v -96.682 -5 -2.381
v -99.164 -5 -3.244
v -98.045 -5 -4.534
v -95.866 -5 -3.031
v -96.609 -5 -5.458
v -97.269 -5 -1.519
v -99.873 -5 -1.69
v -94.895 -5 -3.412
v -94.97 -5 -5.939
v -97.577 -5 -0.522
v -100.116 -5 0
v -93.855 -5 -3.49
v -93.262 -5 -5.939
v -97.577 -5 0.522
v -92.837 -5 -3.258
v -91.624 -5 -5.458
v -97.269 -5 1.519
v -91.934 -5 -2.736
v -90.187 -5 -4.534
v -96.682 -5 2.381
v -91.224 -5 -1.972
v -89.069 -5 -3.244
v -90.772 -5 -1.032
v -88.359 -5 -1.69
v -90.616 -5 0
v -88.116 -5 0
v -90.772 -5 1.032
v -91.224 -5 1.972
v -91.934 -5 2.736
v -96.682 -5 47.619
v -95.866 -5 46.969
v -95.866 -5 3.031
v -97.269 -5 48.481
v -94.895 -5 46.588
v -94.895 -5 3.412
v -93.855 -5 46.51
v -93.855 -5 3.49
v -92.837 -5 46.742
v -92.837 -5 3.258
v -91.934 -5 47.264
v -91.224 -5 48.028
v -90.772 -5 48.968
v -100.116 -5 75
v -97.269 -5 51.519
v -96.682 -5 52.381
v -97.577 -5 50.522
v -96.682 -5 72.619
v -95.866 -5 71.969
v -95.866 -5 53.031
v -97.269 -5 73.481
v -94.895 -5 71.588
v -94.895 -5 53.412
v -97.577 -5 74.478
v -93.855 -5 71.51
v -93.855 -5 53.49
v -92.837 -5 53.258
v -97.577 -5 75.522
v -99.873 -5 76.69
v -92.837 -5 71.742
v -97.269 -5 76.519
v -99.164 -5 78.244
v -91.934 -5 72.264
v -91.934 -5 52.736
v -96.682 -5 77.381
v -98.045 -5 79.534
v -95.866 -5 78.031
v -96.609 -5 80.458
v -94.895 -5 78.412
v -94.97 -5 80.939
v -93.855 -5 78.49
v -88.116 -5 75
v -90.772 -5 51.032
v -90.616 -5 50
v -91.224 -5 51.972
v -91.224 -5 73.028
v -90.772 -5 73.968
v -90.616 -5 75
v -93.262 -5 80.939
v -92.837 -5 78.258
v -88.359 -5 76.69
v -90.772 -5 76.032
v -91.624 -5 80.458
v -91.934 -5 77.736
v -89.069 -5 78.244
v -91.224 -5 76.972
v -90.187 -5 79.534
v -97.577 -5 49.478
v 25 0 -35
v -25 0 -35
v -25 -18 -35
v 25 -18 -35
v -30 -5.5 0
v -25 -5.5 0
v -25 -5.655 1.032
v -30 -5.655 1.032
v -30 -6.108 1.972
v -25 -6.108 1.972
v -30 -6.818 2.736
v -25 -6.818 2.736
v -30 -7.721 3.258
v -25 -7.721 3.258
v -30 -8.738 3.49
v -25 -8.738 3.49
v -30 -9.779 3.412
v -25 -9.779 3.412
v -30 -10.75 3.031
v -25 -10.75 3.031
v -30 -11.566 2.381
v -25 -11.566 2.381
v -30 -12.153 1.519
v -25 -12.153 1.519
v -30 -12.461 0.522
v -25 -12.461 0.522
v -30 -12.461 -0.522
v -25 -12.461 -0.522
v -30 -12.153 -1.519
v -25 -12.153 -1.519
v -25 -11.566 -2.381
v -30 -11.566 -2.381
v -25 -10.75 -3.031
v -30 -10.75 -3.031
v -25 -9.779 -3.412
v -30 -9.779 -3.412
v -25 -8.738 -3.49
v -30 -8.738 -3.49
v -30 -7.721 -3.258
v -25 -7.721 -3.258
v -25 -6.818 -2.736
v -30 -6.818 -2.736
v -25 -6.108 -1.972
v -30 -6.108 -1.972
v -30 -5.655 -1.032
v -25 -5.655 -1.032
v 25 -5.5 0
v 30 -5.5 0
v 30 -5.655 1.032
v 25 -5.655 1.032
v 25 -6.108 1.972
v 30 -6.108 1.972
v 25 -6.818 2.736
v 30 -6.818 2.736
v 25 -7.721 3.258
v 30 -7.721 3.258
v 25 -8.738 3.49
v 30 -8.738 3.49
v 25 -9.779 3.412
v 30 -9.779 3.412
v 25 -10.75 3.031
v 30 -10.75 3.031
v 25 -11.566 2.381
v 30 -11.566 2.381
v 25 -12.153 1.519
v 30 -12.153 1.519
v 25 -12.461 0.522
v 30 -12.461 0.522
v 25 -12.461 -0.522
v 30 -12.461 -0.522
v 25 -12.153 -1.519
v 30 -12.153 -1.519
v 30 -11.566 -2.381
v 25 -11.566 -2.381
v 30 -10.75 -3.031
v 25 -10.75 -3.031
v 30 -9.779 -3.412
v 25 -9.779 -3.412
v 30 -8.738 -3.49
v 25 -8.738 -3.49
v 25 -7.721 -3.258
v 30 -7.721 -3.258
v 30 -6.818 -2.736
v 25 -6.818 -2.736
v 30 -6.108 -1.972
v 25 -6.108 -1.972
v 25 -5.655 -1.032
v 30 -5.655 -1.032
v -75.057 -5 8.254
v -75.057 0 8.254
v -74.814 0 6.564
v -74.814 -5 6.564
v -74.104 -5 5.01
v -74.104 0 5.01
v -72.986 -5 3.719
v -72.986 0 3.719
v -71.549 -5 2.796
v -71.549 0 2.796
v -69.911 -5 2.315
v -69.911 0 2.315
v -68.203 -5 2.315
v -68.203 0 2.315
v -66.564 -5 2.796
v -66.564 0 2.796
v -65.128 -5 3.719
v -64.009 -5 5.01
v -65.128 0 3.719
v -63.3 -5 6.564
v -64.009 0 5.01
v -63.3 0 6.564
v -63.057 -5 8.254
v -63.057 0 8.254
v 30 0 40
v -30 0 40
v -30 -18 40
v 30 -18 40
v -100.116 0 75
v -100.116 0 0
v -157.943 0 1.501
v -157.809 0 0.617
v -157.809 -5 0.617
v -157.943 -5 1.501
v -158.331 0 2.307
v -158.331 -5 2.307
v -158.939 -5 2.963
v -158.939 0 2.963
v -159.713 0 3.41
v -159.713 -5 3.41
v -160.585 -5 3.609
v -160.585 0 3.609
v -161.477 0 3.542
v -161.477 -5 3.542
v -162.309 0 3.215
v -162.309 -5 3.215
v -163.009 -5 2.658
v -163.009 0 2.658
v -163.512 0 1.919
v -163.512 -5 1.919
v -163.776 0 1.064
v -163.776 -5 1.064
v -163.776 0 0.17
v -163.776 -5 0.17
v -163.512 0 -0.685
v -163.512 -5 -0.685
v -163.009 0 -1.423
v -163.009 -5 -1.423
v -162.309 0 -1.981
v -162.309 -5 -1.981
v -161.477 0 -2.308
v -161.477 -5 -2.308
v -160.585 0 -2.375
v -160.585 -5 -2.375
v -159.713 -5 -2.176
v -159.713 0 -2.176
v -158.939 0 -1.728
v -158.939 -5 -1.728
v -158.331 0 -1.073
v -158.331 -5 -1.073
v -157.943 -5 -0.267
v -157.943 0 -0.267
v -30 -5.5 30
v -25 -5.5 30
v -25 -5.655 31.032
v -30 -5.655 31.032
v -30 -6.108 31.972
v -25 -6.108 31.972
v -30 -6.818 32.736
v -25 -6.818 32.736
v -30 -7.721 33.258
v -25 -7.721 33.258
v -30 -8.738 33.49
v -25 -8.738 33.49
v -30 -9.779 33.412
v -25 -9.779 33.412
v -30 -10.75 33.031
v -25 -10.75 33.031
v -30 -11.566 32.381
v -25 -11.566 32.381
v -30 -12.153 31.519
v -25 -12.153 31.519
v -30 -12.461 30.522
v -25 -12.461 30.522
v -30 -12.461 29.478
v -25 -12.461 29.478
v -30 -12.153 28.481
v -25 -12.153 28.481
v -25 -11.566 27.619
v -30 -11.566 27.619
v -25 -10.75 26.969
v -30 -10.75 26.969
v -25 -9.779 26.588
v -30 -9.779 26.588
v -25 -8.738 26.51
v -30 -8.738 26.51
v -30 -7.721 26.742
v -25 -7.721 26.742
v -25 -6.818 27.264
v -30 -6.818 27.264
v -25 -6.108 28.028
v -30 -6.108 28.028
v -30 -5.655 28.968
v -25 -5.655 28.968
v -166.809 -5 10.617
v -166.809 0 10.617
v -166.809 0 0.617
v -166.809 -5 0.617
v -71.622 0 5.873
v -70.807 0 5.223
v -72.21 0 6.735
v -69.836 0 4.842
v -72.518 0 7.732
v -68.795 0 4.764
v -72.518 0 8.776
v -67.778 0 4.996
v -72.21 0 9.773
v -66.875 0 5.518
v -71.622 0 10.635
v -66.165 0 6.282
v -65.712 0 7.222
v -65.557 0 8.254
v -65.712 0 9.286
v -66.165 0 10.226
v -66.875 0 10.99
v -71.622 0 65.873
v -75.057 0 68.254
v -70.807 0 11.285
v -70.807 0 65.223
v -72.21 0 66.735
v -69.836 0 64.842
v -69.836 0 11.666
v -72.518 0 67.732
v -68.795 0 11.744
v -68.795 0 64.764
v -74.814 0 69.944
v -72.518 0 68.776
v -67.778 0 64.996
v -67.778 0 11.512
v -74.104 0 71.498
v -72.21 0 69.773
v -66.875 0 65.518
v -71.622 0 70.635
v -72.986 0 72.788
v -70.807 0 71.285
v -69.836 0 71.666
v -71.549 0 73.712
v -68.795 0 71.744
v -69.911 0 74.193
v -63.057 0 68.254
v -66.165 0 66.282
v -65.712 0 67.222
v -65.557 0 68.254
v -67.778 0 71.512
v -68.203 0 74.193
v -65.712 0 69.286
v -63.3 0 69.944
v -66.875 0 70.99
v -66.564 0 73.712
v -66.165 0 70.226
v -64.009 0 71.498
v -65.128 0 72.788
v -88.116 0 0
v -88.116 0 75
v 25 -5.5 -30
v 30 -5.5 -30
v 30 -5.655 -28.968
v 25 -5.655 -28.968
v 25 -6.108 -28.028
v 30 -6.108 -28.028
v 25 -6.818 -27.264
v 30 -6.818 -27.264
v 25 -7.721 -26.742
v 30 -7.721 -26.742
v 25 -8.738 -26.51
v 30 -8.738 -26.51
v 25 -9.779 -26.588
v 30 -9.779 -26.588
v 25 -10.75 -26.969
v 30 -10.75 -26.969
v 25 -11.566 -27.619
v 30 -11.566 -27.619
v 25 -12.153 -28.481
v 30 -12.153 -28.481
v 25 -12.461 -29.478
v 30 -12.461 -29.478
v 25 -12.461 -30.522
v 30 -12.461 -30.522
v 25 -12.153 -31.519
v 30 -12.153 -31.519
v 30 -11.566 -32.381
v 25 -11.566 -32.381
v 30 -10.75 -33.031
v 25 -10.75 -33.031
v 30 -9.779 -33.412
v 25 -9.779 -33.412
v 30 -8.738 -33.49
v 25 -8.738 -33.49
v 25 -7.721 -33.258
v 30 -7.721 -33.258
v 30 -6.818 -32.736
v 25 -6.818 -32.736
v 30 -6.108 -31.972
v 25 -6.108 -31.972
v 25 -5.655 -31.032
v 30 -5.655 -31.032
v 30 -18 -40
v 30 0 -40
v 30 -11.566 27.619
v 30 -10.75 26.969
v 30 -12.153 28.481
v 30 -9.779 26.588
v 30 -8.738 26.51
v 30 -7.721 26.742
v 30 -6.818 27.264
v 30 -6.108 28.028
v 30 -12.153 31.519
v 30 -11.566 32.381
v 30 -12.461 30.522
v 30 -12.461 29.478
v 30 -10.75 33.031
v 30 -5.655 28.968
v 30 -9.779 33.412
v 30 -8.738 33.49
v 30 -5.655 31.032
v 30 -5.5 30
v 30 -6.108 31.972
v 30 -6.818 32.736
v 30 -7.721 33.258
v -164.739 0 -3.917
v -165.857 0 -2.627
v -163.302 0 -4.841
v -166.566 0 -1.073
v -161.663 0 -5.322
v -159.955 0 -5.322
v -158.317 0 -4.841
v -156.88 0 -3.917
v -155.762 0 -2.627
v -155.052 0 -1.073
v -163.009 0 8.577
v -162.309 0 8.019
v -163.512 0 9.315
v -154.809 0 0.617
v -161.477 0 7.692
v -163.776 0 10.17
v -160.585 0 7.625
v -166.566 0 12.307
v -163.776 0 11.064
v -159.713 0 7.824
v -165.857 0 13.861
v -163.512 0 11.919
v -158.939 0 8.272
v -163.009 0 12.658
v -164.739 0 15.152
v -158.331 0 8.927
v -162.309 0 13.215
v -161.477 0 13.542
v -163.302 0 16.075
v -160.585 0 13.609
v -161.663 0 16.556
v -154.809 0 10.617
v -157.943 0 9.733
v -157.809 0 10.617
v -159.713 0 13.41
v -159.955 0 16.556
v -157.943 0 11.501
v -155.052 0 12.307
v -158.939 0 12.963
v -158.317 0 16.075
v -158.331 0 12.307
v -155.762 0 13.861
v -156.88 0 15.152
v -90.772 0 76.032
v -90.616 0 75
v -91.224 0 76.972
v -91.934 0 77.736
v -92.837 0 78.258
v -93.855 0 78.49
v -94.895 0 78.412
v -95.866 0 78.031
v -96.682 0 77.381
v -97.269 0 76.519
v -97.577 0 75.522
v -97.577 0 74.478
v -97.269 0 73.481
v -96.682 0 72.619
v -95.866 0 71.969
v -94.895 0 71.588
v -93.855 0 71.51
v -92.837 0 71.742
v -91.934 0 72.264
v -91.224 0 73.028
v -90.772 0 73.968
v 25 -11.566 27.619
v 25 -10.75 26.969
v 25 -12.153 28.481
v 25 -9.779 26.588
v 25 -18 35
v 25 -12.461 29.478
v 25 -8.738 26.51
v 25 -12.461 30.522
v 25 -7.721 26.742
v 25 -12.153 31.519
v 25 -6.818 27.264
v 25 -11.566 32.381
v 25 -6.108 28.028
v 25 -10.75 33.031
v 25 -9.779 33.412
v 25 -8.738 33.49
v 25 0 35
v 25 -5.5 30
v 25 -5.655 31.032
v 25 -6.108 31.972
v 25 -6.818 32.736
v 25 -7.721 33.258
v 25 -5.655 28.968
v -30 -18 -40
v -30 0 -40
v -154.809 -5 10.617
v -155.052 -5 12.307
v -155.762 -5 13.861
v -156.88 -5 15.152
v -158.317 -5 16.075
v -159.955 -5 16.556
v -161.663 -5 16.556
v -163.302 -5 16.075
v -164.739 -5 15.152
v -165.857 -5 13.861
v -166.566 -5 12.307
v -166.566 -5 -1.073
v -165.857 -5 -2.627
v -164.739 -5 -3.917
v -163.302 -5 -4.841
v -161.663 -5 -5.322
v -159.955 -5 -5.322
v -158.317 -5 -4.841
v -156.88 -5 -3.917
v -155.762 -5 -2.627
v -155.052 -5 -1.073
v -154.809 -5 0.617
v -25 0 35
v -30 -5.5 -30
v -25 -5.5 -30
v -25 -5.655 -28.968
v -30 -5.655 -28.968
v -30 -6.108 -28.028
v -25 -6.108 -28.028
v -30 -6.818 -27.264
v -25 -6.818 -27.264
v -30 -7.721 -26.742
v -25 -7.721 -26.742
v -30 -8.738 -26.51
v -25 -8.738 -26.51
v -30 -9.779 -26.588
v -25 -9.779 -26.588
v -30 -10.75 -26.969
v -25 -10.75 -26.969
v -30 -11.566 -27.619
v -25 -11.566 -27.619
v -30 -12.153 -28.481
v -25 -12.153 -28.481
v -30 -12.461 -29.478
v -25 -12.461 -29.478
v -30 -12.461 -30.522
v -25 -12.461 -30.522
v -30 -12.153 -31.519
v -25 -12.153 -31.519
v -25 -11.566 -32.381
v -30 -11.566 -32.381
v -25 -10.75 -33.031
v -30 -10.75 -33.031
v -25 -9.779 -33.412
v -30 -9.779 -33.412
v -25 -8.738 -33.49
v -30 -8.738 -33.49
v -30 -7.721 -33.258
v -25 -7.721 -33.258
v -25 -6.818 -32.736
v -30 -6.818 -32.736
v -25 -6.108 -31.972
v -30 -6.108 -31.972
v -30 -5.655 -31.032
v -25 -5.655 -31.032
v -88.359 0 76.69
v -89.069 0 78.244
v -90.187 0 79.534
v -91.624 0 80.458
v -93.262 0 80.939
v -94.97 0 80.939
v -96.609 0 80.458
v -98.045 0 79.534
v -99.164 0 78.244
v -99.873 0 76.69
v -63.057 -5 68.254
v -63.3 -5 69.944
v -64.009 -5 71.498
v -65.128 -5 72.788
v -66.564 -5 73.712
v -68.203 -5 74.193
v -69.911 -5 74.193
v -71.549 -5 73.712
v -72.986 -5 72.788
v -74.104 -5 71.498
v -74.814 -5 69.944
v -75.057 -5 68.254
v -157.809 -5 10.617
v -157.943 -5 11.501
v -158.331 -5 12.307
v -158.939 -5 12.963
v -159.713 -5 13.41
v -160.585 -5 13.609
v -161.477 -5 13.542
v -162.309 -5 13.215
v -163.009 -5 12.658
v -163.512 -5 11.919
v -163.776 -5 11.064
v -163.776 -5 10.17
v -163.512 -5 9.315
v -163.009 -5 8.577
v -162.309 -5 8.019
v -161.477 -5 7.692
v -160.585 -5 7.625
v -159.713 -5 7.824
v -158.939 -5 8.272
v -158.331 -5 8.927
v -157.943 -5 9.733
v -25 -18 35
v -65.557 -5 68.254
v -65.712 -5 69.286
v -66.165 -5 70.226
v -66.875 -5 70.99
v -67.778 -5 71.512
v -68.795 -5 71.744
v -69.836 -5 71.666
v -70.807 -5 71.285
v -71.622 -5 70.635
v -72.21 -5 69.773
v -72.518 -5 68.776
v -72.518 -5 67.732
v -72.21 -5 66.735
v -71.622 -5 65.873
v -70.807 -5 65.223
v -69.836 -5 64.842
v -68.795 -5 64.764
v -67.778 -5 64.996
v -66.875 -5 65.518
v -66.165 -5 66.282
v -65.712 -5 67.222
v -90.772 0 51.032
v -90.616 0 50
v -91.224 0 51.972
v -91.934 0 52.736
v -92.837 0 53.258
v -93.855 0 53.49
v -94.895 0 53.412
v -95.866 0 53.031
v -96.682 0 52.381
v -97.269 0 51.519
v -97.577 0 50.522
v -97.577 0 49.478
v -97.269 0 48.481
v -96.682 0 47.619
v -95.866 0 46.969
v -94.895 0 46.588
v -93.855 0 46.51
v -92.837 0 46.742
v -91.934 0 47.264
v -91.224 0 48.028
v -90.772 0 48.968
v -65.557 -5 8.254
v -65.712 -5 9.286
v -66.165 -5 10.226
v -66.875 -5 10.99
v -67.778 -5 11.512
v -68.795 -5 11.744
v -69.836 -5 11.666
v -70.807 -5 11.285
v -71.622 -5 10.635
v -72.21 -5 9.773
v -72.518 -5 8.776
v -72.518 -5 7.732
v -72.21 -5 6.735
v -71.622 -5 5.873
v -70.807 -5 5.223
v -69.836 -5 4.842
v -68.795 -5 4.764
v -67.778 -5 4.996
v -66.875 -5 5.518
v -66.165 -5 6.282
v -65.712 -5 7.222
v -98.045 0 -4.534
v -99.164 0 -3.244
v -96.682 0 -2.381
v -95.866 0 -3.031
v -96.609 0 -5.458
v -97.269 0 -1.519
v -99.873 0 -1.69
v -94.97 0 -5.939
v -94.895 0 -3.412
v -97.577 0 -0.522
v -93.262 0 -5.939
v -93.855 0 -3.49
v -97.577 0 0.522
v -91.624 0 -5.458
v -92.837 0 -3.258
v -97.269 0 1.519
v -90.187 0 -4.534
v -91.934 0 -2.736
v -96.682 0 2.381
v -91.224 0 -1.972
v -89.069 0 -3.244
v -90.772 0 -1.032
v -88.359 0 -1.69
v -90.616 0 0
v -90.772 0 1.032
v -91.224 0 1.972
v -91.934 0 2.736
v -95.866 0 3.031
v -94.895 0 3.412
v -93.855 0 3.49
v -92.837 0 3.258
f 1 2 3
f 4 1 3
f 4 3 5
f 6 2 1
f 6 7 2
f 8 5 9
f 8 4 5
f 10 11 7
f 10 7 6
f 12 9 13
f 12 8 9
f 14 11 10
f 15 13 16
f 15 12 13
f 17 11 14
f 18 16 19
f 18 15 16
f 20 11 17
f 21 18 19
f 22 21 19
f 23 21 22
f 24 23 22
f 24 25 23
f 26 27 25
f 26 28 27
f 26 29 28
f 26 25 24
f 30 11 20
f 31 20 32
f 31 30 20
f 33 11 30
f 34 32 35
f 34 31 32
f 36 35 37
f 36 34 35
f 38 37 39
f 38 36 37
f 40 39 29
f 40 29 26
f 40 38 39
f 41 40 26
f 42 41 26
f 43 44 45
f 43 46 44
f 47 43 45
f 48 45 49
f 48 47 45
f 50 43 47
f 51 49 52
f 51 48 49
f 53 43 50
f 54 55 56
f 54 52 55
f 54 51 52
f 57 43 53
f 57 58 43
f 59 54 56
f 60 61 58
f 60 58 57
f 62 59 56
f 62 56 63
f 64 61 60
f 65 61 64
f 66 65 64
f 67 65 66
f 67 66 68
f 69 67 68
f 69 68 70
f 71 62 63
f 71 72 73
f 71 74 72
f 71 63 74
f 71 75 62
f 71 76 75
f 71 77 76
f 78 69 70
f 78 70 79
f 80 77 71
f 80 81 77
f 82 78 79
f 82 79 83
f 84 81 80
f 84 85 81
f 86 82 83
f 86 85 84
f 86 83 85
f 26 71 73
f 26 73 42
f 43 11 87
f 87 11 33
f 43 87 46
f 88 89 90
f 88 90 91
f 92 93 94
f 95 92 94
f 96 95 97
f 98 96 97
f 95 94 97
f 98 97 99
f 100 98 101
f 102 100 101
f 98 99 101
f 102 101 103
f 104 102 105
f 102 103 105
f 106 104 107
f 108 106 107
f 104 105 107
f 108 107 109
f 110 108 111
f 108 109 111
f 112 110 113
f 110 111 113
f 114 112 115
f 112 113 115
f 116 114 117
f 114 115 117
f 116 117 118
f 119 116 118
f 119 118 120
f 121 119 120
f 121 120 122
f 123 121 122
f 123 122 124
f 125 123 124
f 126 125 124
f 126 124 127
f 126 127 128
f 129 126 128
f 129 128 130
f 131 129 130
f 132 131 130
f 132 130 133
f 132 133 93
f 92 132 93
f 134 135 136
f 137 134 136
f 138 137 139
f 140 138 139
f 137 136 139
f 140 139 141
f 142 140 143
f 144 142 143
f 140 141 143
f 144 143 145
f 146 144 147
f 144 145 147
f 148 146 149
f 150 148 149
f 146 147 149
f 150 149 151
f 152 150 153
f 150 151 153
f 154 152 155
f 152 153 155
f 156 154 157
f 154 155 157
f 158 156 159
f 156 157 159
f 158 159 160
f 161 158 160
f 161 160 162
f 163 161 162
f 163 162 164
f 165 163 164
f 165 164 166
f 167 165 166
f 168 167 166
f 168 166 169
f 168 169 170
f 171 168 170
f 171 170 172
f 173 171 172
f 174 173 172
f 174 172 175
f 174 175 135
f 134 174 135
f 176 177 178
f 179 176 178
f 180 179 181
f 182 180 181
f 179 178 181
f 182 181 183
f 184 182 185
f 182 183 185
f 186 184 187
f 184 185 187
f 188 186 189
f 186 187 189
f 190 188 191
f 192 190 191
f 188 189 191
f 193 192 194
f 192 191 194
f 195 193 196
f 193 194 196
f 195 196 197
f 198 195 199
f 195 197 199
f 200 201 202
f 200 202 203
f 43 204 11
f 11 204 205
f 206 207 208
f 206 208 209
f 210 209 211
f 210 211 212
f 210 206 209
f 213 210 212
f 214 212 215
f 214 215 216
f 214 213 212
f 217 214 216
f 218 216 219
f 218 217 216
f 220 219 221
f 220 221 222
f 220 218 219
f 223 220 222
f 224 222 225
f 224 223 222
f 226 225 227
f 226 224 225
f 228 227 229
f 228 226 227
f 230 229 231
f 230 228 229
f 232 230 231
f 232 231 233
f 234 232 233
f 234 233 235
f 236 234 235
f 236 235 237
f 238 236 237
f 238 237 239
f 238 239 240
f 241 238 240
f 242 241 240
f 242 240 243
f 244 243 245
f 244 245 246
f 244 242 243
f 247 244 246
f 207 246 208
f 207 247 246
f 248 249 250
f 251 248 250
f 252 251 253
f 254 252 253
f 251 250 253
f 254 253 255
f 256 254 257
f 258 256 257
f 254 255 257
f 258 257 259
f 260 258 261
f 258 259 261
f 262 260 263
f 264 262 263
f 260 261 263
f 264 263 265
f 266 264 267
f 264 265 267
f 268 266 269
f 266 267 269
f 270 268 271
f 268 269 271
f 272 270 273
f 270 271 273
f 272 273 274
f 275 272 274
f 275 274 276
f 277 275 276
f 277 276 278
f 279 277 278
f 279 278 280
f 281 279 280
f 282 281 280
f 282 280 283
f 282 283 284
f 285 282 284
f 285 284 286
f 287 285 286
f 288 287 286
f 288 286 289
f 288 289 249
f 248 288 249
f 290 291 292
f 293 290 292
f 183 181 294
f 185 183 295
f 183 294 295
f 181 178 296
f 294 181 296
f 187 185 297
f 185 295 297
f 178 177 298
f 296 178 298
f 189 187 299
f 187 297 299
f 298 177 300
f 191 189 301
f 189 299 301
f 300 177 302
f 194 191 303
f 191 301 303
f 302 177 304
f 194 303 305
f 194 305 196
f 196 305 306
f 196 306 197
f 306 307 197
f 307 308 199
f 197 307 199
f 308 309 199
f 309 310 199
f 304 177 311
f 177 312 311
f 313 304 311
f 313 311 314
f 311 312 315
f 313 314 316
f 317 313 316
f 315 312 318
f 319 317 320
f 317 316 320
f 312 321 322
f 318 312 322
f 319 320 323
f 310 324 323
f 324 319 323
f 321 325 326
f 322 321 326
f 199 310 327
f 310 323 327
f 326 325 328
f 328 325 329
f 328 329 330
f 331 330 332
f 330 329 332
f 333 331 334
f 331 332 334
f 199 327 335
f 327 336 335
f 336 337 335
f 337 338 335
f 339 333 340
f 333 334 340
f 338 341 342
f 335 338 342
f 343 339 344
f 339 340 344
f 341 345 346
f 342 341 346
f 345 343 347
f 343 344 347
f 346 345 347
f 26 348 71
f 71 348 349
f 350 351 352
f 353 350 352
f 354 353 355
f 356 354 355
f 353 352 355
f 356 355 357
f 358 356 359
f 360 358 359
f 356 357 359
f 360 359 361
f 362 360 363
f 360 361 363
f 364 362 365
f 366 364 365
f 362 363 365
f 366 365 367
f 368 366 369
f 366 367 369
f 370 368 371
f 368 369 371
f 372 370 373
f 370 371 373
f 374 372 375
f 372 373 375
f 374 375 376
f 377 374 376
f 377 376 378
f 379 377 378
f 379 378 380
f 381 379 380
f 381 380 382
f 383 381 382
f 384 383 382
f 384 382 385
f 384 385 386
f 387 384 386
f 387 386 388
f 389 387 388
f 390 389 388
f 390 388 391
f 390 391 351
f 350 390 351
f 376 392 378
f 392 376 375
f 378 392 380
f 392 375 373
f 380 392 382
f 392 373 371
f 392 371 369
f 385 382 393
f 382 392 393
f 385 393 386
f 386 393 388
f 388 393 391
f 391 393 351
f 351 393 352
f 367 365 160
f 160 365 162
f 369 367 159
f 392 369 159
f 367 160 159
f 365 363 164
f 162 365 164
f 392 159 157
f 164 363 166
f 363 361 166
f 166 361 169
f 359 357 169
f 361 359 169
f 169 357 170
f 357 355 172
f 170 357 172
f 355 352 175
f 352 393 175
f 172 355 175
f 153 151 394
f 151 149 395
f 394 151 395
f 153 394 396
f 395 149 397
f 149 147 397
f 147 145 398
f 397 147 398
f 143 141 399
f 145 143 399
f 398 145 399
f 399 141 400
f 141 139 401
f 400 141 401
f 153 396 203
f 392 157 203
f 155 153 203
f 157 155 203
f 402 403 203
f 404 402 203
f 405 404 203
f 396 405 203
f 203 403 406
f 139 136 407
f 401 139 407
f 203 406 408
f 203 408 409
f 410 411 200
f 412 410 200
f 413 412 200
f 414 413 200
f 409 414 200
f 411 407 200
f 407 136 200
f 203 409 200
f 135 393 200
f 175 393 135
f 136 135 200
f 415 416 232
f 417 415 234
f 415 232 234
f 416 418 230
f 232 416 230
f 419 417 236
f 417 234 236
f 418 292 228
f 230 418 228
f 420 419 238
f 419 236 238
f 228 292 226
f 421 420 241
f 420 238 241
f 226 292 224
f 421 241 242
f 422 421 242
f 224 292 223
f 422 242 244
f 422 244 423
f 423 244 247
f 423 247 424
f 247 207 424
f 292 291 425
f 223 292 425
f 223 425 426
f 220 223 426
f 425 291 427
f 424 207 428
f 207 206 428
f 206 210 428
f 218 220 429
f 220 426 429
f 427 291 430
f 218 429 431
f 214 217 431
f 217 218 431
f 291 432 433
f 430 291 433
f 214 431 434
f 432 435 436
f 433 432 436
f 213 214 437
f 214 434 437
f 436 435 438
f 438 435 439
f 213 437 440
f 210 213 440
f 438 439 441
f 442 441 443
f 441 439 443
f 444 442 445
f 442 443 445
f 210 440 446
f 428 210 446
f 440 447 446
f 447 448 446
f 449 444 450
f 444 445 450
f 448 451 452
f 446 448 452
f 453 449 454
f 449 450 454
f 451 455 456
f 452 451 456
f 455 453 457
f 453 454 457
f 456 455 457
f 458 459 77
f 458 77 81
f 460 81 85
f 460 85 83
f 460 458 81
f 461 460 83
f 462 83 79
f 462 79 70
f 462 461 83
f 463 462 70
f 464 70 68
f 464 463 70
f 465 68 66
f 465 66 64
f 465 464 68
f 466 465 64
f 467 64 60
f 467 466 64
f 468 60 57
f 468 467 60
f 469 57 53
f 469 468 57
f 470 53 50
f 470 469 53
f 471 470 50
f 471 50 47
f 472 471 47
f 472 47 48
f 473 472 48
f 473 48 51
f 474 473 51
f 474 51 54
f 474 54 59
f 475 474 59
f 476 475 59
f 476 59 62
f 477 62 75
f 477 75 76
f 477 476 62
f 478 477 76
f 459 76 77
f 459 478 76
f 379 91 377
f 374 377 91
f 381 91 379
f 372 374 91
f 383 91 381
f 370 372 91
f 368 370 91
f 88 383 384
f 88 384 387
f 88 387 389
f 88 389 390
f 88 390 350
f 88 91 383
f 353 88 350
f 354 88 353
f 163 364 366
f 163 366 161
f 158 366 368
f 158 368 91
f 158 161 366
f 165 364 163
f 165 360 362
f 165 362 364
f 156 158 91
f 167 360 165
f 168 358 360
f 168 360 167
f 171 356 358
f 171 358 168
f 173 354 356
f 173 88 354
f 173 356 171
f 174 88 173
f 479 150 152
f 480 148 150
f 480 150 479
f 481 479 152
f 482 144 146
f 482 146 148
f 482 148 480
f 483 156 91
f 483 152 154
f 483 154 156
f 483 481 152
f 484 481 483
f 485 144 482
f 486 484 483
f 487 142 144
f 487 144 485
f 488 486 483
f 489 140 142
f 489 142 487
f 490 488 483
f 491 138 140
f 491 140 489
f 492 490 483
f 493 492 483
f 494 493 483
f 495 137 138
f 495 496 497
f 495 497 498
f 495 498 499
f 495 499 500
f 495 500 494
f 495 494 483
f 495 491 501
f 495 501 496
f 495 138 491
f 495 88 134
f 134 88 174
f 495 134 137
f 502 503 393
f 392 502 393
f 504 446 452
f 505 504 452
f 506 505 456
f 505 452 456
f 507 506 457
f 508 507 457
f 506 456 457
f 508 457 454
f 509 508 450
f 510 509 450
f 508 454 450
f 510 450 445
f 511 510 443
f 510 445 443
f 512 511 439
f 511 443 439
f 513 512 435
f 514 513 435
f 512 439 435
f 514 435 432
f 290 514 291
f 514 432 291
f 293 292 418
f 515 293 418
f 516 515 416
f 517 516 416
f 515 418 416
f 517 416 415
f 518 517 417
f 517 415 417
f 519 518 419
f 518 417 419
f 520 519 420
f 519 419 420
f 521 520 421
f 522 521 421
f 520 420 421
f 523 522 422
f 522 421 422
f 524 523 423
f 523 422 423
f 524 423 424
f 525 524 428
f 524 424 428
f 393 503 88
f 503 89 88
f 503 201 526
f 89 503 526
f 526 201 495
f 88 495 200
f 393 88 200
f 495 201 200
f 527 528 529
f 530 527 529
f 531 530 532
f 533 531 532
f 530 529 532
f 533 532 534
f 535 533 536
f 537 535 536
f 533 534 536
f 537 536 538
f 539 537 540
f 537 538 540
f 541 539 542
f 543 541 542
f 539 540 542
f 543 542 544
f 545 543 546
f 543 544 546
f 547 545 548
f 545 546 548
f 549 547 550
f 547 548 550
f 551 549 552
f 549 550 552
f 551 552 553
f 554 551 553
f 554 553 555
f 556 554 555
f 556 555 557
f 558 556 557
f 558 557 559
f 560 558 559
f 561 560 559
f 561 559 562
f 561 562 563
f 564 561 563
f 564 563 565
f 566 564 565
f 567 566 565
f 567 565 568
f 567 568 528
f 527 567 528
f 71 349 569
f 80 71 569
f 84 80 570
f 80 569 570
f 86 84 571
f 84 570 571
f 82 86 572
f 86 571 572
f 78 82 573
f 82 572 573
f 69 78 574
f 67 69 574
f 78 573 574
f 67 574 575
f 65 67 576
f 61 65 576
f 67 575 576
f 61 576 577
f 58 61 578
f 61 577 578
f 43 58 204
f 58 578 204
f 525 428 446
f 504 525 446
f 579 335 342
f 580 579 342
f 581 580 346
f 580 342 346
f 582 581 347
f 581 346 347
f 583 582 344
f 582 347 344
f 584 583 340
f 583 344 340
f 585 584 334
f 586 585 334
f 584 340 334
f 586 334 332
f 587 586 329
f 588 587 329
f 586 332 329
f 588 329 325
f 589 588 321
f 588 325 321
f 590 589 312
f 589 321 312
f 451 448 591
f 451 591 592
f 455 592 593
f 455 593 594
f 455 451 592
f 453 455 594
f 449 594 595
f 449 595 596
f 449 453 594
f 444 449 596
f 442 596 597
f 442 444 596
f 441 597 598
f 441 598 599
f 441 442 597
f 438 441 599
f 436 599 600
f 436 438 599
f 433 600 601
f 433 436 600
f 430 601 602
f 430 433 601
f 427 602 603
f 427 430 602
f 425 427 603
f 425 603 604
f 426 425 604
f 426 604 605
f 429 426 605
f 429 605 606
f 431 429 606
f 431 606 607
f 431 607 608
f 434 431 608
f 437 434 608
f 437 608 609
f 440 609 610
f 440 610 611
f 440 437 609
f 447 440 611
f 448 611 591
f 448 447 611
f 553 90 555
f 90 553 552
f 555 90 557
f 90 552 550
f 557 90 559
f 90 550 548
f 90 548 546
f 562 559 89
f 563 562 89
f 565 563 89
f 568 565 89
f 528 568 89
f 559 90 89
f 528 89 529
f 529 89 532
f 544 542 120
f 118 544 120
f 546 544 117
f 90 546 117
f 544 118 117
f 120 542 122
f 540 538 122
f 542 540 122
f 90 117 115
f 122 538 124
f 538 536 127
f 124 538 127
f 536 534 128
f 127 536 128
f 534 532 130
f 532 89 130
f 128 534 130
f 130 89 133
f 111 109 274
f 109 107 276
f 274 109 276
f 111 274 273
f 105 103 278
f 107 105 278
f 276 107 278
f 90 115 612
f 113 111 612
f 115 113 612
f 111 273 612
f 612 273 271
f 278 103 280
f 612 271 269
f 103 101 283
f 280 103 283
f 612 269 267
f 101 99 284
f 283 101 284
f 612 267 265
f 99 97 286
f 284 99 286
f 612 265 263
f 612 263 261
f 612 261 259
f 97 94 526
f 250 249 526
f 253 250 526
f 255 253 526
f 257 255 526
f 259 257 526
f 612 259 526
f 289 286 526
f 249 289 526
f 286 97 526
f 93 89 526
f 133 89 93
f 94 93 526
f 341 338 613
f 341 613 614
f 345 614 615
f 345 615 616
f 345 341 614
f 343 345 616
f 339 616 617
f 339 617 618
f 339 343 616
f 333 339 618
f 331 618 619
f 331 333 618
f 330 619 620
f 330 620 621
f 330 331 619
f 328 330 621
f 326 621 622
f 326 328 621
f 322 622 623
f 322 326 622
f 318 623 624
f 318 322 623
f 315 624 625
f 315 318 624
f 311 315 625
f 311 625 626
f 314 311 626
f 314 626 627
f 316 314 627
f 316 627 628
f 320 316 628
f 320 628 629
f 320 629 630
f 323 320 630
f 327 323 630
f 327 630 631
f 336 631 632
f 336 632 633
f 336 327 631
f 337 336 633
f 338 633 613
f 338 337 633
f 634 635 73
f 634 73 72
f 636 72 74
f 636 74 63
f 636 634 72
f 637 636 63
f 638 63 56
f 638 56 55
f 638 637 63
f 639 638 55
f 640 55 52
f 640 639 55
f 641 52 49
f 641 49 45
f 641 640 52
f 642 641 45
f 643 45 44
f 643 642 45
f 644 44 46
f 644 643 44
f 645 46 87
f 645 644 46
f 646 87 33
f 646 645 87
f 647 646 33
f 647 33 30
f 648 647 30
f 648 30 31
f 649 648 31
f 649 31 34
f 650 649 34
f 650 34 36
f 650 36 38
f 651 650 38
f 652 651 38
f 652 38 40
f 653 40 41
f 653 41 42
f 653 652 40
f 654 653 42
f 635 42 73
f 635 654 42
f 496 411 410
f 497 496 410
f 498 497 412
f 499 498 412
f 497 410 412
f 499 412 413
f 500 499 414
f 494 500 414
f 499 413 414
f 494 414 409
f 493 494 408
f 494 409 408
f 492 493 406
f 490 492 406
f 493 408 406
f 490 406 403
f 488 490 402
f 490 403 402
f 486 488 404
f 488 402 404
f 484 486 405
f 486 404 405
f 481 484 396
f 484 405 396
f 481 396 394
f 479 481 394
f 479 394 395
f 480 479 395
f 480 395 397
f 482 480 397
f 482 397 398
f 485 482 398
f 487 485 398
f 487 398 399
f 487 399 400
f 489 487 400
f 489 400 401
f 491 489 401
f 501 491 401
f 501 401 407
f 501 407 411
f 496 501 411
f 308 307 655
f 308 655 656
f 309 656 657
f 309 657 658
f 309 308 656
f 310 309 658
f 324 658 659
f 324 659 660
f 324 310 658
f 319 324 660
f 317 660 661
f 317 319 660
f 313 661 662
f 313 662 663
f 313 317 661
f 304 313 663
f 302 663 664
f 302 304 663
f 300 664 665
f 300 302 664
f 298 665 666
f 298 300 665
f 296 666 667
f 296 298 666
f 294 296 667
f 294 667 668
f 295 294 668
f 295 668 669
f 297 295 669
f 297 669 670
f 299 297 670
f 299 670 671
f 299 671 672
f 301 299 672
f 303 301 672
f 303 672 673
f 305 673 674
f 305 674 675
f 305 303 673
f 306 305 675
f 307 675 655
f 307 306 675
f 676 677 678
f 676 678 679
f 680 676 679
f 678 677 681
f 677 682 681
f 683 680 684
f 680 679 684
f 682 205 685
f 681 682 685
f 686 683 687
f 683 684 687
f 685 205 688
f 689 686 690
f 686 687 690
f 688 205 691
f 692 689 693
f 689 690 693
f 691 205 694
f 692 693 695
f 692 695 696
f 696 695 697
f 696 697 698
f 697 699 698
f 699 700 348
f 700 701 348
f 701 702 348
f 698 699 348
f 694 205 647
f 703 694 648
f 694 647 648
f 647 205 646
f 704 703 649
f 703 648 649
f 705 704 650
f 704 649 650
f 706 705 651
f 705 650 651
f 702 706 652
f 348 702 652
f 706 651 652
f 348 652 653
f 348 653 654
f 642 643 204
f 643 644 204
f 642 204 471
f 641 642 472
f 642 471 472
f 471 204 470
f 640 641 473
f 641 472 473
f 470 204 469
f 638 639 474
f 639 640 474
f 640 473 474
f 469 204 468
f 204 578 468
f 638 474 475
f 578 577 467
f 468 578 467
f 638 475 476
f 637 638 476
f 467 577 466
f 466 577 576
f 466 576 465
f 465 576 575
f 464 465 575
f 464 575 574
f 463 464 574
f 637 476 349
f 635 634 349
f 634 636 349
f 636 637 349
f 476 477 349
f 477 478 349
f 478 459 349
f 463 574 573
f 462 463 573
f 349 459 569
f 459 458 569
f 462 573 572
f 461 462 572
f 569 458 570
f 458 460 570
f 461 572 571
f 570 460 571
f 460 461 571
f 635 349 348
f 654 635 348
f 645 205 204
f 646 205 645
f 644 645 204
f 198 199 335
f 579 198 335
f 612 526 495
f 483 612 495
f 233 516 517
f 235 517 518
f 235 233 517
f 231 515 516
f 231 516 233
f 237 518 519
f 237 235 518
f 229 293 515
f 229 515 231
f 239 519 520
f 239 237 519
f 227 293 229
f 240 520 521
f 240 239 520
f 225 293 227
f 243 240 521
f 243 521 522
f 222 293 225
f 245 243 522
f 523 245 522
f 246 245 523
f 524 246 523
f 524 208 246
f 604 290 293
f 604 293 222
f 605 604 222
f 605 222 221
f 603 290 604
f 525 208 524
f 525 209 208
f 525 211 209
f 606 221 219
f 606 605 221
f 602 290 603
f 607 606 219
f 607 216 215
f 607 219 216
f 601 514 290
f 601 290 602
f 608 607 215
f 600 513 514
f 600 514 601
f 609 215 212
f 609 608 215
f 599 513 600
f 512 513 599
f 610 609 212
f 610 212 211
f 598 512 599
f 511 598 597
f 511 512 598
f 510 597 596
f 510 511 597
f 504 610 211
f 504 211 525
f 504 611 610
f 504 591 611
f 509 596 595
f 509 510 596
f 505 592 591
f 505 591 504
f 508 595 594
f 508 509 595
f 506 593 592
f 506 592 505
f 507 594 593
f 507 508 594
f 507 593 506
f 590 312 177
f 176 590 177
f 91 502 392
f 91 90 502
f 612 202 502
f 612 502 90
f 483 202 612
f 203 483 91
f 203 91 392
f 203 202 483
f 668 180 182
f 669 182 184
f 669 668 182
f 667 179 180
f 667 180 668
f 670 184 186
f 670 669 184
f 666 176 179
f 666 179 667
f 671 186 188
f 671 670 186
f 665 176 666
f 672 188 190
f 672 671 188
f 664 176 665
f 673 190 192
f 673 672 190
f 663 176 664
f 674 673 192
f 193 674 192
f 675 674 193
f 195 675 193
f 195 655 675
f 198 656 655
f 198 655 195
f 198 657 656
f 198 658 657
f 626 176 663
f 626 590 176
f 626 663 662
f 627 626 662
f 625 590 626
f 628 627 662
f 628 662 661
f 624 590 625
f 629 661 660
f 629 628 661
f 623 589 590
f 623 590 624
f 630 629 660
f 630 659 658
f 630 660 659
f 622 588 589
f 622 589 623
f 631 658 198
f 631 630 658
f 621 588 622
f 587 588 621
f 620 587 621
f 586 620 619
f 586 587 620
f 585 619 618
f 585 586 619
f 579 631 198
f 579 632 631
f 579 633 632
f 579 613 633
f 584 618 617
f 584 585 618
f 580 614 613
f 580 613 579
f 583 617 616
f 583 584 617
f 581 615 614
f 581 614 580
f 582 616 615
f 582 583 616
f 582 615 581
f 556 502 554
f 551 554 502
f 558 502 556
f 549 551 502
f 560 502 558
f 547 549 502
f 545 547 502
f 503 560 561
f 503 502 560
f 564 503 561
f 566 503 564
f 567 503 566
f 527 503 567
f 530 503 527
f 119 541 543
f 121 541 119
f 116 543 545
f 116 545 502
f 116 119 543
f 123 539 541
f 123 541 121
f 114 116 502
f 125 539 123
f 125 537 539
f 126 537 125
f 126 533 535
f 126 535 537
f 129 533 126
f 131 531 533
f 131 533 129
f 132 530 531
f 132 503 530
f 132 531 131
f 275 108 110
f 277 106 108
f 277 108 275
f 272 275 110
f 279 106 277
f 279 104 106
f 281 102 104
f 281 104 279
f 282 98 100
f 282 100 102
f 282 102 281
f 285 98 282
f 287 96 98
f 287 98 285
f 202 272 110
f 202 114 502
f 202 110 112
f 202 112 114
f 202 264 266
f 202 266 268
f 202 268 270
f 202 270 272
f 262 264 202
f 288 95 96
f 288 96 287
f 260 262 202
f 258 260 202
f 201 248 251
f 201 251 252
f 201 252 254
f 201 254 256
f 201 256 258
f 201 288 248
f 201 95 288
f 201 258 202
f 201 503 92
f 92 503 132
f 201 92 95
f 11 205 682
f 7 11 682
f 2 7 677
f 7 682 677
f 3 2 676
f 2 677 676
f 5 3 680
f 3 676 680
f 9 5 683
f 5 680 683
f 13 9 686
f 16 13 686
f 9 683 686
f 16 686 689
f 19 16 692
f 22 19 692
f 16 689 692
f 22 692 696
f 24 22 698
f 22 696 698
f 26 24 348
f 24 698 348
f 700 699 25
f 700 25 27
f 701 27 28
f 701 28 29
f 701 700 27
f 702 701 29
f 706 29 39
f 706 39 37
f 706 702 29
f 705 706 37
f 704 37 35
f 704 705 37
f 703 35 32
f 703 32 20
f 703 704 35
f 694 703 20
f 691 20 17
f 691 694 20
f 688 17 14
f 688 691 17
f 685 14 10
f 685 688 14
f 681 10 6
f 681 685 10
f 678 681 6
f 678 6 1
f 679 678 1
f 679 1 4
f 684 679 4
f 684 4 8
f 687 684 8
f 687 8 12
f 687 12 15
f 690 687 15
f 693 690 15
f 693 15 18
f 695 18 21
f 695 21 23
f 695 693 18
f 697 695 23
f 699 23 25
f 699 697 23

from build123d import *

# Parameters (mm, degrees)
F0_W     = 60
F0_H     = 80
F0_W_2   = 50
F0_H_2   = 70
F1_DEPTH = 18
F2_R     = 3.5
F3_DEPTH = 60.001
F4_R     = 3.5
F5_DEPTH = 5
F6_R     = 3.5
F7_DEPTH = 5
F8_R     = 3
F9_DEPTH = 5


with BuildPart() as f1:
    # F0 (on Front) → F1 (new body)
    with BuildSketch(Plane.XZ):
        Rectangle(F0_W, F0_H)
        Rectangle(F0_W_2, F0_H_2, mode=Mode.SUBTRACT)
    extrude(amount=F1_DEPTH)

    # F2 (on face) → F3 (cut, through all)
    with BuildSketch(Plane.YZ.offset(30)):
        with Locations((-9, -30)):
            Circle(F2_R)
        with Locations((-9, 0)):
            Circle(F2_R)
        with Locations((-9, 30)):
            Circle(F2_R)
    extrude(amount=-F3_DEPTH, mode=Mode.SUBTRACT)


with BuildPart() as f5:
    # F4 (on Front) → F5 (new body)
    with BuildSketch(Plane.XZ):
        with BuildLine():
            ThreePointArc((-100.116094, 0), (-94.116094, -6), (-88.116094, 0))
            Line((-88.116094, 0), (-88.116094, 75))
            ThreePointArc((-88.116094, 75), (-94.116094, 81), (-100.116094, 75))
            Line((-100.116094, 75), (-100.116094, 0))
        make_face()
        with Locations((-94.116094, 0)):
            Circle(F4_R, mode=Mode.SUBTRACT)
        with Locations((-94.116094, 50)):
            Circle(F4_R, mode=Mode.SUBTRACT)
        with Locations((-94.116094, 75)):
            Circle(F4_R, mode=Mode.SUBTRACT)
    extrude(amount=F5_DEPTH)


with BuildPart() as f7:
    # F6 (on Front) → F7 (new body)
    with BuildSketch(Plane.XZ):
        with BuildLine():
            ThreePointArc((-75.056734, 8.253948), (-69.056734, 2.253948), (-63.056734, 8.253948))
            Line((-63.056734, 8.253948), (-63.056734, 68.253948))
            ThreePointArc((-63.056734, 68.253948), (-69.056734, 74.253948), (-75.056734, 68.253948))
            Line((-75.056734, 68.253948), (-75.056734, 8.253948))
        make_face()
        with Locations((-69.056734, 8.253948)):
            Circle(F6_R, mode=Mode.SUBTRACT)
        with Locations((-69.056734, 68.253948)):
            Circle(F6_R, mode=Mode.SUBTRACT)
    extrude(amount=F7_DEPTH)


with BuildPart() as f9:
    # F8 (on Front) → F9 (new body)
    with BuildSketch(Plane.XZ):
        with BuildLine():
            Line((-166.809368, 10.617104), (-166.809368, 0.617104))
            ThreePointArc((-166.809368, 0.617104), (-160.809368, -5.382896), (-154.809368, 0.617104))
            Line((-154.809368, 0.617104), (-154.809368, 10.617104))
            ThreePointArc((-154.809368, 10.617104), (-160.809368, 16.617104), (-166.809368, 10.617104))
        make_face()
        with Locations((-160.809368, 0.617104)):
            Circle(F8_R, mode=Mode.SUBTRACT)
        with Locations((-160.809368, 10.617104)):
            Circle(F8_R, mode=Mode.SUBTRACT)
    extrude(amount=F9_DEPTH)


solid = Compound([f1.part, f5.part, f7.part, f9.part])
